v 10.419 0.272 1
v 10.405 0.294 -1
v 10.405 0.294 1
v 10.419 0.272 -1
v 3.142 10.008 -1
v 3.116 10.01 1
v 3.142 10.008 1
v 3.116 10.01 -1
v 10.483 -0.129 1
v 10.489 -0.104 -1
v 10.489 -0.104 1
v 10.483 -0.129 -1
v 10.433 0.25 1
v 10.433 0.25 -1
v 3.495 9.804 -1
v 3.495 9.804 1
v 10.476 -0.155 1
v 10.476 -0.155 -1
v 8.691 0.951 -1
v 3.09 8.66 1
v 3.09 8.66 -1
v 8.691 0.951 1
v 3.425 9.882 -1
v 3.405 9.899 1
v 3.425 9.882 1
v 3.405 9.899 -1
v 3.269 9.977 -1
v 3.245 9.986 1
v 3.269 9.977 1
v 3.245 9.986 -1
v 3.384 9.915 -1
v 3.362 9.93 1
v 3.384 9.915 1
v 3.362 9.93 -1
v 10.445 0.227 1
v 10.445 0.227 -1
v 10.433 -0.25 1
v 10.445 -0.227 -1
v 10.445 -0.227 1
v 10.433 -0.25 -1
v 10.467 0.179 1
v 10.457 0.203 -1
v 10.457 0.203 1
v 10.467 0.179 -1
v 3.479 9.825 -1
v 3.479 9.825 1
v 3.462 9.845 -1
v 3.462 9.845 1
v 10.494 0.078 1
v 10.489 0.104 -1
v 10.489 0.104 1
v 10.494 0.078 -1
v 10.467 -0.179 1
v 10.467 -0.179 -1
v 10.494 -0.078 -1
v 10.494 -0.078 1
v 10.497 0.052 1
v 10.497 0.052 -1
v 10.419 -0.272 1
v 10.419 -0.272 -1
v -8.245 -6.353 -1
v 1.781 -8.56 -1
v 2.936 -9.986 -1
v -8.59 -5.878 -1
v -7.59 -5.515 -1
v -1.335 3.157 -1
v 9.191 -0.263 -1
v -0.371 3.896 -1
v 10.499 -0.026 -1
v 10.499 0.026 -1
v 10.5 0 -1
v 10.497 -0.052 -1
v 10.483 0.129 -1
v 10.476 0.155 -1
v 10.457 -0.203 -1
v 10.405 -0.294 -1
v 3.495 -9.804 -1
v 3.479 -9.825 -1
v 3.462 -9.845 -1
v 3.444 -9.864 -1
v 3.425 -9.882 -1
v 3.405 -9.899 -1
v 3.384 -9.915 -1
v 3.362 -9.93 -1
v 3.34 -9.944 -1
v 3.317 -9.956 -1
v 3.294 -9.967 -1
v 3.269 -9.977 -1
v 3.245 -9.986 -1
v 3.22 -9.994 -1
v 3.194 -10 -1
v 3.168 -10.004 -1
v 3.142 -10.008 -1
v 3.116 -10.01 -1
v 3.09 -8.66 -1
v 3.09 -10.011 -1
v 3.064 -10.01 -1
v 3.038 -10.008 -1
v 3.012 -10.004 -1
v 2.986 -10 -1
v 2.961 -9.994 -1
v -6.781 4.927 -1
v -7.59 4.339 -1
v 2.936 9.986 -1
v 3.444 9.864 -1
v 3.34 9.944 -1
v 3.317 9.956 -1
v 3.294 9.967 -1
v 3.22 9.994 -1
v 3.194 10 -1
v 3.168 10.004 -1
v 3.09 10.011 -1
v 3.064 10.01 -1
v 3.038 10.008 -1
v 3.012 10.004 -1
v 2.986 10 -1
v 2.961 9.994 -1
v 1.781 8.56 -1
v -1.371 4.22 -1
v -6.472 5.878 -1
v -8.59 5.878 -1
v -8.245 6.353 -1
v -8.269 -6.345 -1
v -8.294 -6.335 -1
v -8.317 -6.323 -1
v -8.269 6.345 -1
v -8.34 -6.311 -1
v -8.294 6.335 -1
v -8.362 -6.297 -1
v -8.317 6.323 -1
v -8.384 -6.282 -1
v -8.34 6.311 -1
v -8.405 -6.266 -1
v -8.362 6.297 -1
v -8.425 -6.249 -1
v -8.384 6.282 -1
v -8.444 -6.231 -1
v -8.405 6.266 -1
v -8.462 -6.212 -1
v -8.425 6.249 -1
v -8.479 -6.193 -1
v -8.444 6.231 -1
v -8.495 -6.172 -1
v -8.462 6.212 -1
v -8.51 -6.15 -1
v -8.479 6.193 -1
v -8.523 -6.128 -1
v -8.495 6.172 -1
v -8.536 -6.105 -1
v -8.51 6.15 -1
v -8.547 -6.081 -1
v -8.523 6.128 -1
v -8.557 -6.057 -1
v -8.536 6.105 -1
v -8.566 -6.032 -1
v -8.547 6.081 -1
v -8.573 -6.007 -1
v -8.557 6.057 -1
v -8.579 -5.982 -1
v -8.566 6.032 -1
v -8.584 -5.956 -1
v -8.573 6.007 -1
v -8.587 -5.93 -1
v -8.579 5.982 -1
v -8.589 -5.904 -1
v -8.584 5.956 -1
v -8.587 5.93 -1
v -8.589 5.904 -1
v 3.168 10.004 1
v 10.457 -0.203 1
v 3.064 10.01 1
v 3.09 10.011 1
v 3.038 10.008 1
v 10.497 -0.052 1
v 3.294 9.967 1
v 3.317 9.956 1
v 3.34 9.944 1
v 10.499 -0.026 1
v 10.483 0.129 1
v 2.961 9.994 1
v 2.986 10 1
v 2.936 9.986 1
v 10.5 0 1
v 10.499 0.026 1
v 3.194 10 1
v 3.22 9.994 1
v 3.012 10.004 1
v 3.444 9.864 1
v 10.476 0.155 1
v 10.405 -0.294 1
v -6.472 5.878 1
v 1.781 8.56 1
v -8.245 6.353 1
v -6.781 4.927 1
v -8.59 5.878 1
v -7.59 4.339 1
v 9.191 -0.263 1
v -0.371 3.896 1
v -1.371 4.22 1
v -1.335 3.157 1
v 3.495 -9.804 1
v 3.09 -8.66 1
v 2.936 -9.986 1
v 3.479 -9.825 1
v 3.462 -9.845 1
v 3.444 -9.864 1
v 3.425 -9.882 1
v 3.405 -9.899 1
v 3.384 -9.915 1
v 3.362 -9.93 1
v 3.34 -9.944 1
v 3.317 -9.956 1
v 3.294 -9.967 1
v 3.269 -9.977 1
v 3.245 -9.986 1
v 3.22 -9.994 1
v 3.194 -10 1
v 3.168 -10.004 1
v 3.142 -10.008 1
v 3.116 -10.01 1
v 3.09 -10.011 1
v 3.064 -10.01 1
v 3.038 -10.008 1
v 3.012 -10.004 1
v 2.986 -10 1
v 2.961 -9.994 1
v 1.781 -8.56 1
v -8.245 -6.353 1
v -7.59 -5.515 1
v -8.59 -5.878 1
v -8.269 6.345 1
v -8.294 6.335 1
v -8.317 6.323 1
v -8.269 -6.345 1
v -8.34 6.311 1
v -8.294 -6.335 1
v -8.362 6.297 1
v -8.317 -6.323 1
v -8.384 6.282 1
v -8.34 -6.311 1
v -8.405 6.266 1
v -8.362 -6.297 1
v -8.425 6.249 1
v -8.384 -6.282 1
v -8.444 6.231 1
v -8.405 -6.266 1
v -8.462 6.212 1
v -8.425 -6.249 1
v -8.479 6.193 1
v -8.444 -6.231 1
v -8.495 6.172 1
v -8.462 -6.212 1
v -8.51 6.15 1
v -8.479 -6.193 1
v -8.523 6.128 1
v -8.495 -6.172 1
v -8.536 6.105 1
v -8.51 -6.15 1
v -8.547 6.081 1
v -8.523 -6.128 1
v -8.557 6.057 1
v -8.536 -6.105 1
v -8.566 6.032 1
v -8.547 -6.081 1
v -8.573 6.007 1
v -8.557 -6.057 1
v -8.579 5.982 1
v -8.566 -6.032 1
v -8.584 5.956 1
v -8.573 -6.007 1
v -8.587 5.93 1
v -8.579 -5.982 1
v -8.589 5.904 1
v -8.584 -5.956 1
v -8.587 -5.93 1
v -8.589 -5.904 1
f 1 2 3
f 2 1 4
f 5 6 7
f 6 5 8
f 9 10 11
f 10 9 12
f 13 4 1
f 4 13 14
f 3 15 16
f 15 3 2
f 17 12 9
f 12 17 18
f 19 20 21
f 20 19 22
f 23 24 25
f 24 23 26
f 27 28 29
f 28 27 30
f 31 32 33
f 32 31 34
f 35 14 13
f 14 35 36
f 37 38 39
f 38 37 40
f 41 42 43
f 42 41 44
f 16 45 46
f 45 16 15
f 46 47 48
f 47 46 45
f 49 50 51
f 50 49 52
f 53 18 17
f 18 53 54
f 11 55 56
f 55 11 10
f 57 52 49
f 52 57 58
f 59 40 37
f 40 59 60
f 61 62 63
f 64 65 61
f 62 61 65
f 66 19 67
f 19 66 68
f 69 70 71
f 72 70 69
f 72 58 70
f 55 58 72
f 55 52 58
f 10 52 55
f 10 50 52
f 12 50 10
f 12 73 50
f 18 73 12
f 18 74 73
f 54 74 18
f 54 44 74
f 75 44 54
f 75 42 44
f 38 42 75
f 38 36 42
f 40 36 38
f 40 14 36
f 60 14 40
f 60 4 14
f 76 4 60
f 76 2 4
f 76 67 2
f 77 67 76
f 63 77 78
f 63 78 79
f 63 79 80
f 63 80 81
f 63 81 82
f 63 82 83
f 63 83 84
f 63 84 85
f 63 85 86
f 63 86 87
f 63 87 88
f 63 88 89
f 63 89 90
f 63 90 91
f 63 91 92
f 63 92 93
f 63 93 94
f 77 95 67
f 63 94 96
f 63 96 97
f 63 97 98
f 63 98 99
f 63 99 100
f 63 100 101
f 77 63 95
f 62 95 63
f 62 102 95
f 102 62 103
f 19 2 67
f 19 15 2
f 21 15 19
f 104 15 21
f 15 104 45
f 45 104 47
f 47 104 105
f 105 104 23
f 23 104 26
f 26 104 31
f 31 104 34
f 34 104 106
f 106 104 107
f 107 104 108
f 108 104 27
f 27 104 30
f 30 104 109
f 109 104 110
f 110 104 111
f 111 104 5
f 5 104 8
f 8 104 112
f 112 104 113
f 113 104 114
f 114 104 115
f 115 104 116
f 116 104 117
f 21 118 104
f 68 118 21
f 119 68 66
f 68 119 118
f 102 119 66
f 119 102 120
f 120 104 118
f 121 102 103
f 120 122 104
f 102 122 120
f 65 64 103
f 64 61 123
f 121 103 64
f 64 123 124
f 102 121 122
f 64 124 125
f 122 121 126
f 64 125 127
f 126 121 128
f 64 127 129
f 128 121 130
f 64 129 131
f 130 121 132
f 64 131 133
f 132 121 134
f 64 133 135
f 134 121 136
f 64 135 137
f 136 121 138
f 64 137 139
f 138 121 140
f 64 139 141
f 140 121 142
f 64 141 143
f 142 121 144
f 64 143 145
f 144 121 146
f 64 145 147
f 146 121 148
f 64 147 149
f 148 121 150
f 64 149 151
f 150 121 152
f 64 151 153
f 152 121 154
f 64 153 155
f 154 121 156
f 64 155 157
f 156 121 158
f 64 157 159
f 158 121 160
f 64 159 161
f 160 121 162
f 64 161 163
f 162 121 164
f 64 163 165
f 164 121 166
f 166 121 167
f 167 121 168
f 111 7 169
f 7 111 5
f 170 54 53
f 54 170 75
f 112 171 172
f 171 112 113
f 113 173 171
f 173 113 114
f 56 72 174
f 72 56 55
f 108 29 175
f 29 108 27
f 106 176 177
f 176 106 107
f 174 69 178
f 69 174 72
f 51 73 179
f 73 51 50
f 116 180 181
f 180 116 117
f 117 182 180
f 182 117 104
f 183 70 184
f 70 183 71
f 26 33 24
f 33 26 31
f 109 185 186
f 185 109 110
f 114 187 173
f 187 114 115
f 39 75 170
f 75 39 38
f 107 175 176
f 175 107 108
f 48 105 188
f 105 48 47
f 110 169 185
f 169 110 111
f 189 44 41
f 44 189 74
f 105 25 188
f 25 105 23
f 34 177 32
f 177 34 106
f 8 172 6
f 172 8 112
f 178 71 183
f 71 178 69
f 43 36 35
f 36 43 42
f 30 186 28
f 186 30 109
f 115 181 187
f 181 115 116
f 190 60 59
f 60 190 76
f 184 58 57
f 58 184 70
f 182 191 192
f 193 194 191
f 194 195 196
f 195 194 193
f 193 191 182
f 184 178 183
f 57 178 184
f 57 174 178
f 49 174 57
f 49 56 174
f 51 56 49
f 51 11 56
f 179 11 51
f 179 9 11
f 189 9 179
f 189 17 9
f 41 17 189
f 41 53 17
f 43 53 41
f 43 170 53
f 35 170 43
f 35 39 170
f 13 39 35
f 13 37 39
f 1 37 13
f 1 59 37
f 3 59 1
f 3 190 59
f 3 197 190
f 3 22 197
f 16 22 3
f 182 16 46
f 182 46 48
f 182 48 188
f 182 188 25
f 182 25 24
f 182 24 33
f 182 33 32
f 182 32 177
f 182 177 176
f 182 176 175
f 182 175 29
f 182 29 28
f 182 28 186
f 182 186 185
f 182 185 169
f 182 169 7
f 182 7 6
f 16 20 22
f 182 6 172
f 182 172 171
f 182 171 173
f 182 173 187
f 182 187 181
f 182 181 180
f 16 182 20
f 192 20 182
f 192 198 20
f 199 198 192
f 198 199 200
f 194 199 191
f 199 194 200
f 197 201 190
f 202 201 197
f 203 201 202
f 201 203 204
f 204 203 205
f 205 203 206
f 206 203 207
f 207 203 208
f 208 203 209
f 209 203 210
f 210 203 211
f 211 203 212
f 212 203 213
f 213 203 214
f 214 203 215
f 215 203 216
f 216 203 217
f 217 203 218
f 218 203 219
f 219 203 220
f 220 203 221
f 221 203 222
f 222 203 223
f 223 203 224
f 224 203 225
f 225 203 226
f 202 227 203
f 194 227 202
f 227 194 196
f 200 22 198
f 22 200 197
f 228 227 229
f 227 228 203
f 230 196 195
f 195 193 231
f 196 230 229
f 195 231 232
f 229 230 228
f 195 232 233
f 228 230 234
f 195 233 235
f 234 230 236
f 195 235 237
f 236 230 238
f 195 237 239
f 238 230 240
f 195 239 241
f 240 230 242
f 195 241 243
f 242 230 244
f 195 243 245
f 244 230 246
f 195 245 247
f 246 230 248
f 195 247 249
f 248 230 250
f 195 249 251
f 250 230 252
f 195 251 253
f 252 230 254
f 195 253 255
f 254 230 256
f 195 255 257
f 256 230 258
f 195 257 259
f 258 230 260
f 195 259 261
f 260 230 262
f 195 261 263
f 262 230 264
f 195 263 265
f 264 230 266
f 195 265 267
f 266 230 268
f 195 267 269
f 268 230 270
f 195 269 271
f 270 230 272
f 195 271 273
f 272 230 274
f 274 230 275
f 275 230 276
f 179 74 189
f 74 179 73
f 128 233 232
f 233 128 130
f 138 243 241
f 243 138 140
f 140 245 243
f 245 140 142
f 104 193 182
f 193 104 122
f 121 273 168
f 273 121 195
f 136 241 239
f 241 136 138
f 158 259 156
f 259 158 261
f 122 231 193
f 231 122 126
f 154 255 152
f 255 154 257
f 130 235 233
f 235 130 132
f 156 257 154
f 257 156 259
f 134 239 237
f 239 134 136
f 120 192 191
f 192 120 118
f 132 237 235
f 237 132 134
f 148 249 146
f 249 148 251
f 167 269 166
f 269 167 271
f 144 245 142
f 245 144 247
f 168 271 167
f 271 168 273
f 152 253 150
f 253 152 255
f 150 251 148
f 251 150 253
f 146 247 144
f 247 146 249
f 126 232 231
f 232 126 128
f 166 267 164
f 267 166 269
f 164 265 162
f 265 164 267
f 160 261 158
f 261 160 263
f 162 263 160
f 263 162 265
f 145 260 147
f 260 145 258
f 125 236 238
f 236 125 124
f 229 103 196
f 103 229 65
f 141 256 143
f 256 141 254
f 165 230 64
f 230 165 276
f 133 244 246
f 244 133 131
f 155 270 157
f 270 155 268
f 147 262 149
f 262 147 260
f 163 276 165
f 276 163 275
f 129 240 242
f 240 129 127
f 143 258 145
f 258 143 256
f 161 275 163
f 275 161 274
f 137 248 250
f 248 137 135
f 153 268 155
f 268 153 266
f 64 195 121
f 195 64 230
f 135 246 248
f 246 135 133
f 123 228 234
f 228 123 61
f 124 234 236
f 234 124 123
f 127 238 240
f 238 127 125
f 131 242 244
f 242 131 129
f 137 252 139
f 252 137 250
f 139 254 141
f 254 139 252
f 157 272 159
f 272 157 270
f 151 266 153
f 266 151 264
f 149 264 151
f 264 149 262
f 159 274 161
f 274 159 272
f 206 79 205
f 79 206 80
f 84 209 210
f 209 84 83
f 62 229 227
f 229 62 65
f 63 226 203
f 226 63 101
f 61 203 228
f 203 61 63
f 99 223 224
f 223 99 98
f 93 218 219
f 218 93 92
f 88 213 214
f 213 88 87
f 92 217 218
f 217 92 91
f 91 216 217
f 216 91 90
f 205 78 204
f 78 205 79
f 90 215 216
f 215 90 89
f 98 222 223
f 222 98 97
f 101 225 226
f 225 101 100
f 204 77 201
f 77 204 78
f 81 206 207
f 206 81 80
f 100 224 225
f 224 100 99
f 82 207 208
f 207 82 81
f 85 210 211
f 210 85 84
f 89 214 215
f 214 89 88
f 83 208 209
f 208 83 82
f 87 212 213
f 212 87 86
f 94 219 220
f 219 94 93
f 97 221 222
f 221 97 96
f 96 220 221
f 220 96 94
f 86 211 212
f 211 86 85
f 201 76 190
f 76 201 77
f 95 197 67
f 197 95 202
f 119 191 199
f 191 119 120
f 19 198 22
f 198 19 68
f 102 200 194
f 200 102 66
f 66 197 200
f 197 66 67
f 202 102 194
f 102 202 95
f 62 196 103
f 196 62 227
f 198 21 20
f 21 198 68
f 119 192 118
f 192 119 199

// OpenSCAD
/* * * * * * * * * * * * * * * * * * * * * * * * * * * * * * * * * * * * *\
 * Copyright (C) Claus Schrammel <claus@f05fk.net>                       *
 *                                                                       *
 * This program is free software: you can redistribute it and/or modify  *
 * it under the terms of the GNU General Public License as published by  *
 * the Free Software Foundation, either version 3 of the License, or     *
 * (at your option) any later version.                                   *
 *                                                                       *
 * This program is distributed in the hope that it will be useful,       *
 * but WITHOUT ANY WARRANTY; without even the implied warranty of        *
 * MERCHANTABILITY or FITNESS FOR A PARTICULAR PURPOSE.  See the         *
 * GNU General Public License for more details.                          *
 *                                                                       *
 * You should have received a copy of the GNU General Public License     *
 * along with this program.  If not, see <http://www.gnu.org/licenses/>. *
 *                                                                       *
 * SPDX-License-Identifier: GPL-3.0-or-later                             *
\* * * * * * * * * * * * * * * * * * * * * * * * * * * * * * * * * * * * */
$fn = 120;

scale(10) PenTaRose();

module PenTaRose(h = 0.2, s = 1, d = 0.05, center = true) {
    A = [        1,         0, 0] * s;
    B = [cos(  72), sin(  72), 0] * s;
    C = [cos( 144), sin( 144), 0] * s;
    D = [cos(-144), sin(-144), 0] * s;
    E = [cos( -72), sin( -72), 0] * s;
    X = [cos( 108), sin( 108), 0] * s * sqrt(14 - 6 * sqrt(5)) / 2;
    r = s * d;
    hull() {
        translate(A) cylinder(h = h, r = r, center = center);
        translate(B) cylinder(h = h, r = r, center = center);
    }
    hull() {
        translate(B) cylinder(h = h, r = r, center = center);
        translate(C) cylinder(h = h, r = r, center = center);
    }
    hull() {
        translate(C) cylinder(h = h, r = r, center = center);
        translate(D) cylinder(h = h, r = r, center = center);
    }
    hull() {
        translate(D) cylinder(h = h, r = r, center = center);
        translate(E) cylinder(h = h, r = r, center = center);
    }
    hull() {
        translate(E) cylinder(h = h, r = r, center = center);
        translate(A) cylinder(h = h, r = r, center = center);
    }
    hull() {
        translate(A) cylinder(h = h, r = r, center = center);
        translate(C) cylinder(h = h, r = r, center = center);
    }
    hull() {
        translate(C) cylinder(h = h, r = r, center = center);
        translate(E) cylinder(h = h, r = r, center = center);
    }
    hull() {
        translate(B) cylinder(h = h, r = r, center = center);
        translate(X) cylinder(h = h, r = r, center = center);
    }
}
